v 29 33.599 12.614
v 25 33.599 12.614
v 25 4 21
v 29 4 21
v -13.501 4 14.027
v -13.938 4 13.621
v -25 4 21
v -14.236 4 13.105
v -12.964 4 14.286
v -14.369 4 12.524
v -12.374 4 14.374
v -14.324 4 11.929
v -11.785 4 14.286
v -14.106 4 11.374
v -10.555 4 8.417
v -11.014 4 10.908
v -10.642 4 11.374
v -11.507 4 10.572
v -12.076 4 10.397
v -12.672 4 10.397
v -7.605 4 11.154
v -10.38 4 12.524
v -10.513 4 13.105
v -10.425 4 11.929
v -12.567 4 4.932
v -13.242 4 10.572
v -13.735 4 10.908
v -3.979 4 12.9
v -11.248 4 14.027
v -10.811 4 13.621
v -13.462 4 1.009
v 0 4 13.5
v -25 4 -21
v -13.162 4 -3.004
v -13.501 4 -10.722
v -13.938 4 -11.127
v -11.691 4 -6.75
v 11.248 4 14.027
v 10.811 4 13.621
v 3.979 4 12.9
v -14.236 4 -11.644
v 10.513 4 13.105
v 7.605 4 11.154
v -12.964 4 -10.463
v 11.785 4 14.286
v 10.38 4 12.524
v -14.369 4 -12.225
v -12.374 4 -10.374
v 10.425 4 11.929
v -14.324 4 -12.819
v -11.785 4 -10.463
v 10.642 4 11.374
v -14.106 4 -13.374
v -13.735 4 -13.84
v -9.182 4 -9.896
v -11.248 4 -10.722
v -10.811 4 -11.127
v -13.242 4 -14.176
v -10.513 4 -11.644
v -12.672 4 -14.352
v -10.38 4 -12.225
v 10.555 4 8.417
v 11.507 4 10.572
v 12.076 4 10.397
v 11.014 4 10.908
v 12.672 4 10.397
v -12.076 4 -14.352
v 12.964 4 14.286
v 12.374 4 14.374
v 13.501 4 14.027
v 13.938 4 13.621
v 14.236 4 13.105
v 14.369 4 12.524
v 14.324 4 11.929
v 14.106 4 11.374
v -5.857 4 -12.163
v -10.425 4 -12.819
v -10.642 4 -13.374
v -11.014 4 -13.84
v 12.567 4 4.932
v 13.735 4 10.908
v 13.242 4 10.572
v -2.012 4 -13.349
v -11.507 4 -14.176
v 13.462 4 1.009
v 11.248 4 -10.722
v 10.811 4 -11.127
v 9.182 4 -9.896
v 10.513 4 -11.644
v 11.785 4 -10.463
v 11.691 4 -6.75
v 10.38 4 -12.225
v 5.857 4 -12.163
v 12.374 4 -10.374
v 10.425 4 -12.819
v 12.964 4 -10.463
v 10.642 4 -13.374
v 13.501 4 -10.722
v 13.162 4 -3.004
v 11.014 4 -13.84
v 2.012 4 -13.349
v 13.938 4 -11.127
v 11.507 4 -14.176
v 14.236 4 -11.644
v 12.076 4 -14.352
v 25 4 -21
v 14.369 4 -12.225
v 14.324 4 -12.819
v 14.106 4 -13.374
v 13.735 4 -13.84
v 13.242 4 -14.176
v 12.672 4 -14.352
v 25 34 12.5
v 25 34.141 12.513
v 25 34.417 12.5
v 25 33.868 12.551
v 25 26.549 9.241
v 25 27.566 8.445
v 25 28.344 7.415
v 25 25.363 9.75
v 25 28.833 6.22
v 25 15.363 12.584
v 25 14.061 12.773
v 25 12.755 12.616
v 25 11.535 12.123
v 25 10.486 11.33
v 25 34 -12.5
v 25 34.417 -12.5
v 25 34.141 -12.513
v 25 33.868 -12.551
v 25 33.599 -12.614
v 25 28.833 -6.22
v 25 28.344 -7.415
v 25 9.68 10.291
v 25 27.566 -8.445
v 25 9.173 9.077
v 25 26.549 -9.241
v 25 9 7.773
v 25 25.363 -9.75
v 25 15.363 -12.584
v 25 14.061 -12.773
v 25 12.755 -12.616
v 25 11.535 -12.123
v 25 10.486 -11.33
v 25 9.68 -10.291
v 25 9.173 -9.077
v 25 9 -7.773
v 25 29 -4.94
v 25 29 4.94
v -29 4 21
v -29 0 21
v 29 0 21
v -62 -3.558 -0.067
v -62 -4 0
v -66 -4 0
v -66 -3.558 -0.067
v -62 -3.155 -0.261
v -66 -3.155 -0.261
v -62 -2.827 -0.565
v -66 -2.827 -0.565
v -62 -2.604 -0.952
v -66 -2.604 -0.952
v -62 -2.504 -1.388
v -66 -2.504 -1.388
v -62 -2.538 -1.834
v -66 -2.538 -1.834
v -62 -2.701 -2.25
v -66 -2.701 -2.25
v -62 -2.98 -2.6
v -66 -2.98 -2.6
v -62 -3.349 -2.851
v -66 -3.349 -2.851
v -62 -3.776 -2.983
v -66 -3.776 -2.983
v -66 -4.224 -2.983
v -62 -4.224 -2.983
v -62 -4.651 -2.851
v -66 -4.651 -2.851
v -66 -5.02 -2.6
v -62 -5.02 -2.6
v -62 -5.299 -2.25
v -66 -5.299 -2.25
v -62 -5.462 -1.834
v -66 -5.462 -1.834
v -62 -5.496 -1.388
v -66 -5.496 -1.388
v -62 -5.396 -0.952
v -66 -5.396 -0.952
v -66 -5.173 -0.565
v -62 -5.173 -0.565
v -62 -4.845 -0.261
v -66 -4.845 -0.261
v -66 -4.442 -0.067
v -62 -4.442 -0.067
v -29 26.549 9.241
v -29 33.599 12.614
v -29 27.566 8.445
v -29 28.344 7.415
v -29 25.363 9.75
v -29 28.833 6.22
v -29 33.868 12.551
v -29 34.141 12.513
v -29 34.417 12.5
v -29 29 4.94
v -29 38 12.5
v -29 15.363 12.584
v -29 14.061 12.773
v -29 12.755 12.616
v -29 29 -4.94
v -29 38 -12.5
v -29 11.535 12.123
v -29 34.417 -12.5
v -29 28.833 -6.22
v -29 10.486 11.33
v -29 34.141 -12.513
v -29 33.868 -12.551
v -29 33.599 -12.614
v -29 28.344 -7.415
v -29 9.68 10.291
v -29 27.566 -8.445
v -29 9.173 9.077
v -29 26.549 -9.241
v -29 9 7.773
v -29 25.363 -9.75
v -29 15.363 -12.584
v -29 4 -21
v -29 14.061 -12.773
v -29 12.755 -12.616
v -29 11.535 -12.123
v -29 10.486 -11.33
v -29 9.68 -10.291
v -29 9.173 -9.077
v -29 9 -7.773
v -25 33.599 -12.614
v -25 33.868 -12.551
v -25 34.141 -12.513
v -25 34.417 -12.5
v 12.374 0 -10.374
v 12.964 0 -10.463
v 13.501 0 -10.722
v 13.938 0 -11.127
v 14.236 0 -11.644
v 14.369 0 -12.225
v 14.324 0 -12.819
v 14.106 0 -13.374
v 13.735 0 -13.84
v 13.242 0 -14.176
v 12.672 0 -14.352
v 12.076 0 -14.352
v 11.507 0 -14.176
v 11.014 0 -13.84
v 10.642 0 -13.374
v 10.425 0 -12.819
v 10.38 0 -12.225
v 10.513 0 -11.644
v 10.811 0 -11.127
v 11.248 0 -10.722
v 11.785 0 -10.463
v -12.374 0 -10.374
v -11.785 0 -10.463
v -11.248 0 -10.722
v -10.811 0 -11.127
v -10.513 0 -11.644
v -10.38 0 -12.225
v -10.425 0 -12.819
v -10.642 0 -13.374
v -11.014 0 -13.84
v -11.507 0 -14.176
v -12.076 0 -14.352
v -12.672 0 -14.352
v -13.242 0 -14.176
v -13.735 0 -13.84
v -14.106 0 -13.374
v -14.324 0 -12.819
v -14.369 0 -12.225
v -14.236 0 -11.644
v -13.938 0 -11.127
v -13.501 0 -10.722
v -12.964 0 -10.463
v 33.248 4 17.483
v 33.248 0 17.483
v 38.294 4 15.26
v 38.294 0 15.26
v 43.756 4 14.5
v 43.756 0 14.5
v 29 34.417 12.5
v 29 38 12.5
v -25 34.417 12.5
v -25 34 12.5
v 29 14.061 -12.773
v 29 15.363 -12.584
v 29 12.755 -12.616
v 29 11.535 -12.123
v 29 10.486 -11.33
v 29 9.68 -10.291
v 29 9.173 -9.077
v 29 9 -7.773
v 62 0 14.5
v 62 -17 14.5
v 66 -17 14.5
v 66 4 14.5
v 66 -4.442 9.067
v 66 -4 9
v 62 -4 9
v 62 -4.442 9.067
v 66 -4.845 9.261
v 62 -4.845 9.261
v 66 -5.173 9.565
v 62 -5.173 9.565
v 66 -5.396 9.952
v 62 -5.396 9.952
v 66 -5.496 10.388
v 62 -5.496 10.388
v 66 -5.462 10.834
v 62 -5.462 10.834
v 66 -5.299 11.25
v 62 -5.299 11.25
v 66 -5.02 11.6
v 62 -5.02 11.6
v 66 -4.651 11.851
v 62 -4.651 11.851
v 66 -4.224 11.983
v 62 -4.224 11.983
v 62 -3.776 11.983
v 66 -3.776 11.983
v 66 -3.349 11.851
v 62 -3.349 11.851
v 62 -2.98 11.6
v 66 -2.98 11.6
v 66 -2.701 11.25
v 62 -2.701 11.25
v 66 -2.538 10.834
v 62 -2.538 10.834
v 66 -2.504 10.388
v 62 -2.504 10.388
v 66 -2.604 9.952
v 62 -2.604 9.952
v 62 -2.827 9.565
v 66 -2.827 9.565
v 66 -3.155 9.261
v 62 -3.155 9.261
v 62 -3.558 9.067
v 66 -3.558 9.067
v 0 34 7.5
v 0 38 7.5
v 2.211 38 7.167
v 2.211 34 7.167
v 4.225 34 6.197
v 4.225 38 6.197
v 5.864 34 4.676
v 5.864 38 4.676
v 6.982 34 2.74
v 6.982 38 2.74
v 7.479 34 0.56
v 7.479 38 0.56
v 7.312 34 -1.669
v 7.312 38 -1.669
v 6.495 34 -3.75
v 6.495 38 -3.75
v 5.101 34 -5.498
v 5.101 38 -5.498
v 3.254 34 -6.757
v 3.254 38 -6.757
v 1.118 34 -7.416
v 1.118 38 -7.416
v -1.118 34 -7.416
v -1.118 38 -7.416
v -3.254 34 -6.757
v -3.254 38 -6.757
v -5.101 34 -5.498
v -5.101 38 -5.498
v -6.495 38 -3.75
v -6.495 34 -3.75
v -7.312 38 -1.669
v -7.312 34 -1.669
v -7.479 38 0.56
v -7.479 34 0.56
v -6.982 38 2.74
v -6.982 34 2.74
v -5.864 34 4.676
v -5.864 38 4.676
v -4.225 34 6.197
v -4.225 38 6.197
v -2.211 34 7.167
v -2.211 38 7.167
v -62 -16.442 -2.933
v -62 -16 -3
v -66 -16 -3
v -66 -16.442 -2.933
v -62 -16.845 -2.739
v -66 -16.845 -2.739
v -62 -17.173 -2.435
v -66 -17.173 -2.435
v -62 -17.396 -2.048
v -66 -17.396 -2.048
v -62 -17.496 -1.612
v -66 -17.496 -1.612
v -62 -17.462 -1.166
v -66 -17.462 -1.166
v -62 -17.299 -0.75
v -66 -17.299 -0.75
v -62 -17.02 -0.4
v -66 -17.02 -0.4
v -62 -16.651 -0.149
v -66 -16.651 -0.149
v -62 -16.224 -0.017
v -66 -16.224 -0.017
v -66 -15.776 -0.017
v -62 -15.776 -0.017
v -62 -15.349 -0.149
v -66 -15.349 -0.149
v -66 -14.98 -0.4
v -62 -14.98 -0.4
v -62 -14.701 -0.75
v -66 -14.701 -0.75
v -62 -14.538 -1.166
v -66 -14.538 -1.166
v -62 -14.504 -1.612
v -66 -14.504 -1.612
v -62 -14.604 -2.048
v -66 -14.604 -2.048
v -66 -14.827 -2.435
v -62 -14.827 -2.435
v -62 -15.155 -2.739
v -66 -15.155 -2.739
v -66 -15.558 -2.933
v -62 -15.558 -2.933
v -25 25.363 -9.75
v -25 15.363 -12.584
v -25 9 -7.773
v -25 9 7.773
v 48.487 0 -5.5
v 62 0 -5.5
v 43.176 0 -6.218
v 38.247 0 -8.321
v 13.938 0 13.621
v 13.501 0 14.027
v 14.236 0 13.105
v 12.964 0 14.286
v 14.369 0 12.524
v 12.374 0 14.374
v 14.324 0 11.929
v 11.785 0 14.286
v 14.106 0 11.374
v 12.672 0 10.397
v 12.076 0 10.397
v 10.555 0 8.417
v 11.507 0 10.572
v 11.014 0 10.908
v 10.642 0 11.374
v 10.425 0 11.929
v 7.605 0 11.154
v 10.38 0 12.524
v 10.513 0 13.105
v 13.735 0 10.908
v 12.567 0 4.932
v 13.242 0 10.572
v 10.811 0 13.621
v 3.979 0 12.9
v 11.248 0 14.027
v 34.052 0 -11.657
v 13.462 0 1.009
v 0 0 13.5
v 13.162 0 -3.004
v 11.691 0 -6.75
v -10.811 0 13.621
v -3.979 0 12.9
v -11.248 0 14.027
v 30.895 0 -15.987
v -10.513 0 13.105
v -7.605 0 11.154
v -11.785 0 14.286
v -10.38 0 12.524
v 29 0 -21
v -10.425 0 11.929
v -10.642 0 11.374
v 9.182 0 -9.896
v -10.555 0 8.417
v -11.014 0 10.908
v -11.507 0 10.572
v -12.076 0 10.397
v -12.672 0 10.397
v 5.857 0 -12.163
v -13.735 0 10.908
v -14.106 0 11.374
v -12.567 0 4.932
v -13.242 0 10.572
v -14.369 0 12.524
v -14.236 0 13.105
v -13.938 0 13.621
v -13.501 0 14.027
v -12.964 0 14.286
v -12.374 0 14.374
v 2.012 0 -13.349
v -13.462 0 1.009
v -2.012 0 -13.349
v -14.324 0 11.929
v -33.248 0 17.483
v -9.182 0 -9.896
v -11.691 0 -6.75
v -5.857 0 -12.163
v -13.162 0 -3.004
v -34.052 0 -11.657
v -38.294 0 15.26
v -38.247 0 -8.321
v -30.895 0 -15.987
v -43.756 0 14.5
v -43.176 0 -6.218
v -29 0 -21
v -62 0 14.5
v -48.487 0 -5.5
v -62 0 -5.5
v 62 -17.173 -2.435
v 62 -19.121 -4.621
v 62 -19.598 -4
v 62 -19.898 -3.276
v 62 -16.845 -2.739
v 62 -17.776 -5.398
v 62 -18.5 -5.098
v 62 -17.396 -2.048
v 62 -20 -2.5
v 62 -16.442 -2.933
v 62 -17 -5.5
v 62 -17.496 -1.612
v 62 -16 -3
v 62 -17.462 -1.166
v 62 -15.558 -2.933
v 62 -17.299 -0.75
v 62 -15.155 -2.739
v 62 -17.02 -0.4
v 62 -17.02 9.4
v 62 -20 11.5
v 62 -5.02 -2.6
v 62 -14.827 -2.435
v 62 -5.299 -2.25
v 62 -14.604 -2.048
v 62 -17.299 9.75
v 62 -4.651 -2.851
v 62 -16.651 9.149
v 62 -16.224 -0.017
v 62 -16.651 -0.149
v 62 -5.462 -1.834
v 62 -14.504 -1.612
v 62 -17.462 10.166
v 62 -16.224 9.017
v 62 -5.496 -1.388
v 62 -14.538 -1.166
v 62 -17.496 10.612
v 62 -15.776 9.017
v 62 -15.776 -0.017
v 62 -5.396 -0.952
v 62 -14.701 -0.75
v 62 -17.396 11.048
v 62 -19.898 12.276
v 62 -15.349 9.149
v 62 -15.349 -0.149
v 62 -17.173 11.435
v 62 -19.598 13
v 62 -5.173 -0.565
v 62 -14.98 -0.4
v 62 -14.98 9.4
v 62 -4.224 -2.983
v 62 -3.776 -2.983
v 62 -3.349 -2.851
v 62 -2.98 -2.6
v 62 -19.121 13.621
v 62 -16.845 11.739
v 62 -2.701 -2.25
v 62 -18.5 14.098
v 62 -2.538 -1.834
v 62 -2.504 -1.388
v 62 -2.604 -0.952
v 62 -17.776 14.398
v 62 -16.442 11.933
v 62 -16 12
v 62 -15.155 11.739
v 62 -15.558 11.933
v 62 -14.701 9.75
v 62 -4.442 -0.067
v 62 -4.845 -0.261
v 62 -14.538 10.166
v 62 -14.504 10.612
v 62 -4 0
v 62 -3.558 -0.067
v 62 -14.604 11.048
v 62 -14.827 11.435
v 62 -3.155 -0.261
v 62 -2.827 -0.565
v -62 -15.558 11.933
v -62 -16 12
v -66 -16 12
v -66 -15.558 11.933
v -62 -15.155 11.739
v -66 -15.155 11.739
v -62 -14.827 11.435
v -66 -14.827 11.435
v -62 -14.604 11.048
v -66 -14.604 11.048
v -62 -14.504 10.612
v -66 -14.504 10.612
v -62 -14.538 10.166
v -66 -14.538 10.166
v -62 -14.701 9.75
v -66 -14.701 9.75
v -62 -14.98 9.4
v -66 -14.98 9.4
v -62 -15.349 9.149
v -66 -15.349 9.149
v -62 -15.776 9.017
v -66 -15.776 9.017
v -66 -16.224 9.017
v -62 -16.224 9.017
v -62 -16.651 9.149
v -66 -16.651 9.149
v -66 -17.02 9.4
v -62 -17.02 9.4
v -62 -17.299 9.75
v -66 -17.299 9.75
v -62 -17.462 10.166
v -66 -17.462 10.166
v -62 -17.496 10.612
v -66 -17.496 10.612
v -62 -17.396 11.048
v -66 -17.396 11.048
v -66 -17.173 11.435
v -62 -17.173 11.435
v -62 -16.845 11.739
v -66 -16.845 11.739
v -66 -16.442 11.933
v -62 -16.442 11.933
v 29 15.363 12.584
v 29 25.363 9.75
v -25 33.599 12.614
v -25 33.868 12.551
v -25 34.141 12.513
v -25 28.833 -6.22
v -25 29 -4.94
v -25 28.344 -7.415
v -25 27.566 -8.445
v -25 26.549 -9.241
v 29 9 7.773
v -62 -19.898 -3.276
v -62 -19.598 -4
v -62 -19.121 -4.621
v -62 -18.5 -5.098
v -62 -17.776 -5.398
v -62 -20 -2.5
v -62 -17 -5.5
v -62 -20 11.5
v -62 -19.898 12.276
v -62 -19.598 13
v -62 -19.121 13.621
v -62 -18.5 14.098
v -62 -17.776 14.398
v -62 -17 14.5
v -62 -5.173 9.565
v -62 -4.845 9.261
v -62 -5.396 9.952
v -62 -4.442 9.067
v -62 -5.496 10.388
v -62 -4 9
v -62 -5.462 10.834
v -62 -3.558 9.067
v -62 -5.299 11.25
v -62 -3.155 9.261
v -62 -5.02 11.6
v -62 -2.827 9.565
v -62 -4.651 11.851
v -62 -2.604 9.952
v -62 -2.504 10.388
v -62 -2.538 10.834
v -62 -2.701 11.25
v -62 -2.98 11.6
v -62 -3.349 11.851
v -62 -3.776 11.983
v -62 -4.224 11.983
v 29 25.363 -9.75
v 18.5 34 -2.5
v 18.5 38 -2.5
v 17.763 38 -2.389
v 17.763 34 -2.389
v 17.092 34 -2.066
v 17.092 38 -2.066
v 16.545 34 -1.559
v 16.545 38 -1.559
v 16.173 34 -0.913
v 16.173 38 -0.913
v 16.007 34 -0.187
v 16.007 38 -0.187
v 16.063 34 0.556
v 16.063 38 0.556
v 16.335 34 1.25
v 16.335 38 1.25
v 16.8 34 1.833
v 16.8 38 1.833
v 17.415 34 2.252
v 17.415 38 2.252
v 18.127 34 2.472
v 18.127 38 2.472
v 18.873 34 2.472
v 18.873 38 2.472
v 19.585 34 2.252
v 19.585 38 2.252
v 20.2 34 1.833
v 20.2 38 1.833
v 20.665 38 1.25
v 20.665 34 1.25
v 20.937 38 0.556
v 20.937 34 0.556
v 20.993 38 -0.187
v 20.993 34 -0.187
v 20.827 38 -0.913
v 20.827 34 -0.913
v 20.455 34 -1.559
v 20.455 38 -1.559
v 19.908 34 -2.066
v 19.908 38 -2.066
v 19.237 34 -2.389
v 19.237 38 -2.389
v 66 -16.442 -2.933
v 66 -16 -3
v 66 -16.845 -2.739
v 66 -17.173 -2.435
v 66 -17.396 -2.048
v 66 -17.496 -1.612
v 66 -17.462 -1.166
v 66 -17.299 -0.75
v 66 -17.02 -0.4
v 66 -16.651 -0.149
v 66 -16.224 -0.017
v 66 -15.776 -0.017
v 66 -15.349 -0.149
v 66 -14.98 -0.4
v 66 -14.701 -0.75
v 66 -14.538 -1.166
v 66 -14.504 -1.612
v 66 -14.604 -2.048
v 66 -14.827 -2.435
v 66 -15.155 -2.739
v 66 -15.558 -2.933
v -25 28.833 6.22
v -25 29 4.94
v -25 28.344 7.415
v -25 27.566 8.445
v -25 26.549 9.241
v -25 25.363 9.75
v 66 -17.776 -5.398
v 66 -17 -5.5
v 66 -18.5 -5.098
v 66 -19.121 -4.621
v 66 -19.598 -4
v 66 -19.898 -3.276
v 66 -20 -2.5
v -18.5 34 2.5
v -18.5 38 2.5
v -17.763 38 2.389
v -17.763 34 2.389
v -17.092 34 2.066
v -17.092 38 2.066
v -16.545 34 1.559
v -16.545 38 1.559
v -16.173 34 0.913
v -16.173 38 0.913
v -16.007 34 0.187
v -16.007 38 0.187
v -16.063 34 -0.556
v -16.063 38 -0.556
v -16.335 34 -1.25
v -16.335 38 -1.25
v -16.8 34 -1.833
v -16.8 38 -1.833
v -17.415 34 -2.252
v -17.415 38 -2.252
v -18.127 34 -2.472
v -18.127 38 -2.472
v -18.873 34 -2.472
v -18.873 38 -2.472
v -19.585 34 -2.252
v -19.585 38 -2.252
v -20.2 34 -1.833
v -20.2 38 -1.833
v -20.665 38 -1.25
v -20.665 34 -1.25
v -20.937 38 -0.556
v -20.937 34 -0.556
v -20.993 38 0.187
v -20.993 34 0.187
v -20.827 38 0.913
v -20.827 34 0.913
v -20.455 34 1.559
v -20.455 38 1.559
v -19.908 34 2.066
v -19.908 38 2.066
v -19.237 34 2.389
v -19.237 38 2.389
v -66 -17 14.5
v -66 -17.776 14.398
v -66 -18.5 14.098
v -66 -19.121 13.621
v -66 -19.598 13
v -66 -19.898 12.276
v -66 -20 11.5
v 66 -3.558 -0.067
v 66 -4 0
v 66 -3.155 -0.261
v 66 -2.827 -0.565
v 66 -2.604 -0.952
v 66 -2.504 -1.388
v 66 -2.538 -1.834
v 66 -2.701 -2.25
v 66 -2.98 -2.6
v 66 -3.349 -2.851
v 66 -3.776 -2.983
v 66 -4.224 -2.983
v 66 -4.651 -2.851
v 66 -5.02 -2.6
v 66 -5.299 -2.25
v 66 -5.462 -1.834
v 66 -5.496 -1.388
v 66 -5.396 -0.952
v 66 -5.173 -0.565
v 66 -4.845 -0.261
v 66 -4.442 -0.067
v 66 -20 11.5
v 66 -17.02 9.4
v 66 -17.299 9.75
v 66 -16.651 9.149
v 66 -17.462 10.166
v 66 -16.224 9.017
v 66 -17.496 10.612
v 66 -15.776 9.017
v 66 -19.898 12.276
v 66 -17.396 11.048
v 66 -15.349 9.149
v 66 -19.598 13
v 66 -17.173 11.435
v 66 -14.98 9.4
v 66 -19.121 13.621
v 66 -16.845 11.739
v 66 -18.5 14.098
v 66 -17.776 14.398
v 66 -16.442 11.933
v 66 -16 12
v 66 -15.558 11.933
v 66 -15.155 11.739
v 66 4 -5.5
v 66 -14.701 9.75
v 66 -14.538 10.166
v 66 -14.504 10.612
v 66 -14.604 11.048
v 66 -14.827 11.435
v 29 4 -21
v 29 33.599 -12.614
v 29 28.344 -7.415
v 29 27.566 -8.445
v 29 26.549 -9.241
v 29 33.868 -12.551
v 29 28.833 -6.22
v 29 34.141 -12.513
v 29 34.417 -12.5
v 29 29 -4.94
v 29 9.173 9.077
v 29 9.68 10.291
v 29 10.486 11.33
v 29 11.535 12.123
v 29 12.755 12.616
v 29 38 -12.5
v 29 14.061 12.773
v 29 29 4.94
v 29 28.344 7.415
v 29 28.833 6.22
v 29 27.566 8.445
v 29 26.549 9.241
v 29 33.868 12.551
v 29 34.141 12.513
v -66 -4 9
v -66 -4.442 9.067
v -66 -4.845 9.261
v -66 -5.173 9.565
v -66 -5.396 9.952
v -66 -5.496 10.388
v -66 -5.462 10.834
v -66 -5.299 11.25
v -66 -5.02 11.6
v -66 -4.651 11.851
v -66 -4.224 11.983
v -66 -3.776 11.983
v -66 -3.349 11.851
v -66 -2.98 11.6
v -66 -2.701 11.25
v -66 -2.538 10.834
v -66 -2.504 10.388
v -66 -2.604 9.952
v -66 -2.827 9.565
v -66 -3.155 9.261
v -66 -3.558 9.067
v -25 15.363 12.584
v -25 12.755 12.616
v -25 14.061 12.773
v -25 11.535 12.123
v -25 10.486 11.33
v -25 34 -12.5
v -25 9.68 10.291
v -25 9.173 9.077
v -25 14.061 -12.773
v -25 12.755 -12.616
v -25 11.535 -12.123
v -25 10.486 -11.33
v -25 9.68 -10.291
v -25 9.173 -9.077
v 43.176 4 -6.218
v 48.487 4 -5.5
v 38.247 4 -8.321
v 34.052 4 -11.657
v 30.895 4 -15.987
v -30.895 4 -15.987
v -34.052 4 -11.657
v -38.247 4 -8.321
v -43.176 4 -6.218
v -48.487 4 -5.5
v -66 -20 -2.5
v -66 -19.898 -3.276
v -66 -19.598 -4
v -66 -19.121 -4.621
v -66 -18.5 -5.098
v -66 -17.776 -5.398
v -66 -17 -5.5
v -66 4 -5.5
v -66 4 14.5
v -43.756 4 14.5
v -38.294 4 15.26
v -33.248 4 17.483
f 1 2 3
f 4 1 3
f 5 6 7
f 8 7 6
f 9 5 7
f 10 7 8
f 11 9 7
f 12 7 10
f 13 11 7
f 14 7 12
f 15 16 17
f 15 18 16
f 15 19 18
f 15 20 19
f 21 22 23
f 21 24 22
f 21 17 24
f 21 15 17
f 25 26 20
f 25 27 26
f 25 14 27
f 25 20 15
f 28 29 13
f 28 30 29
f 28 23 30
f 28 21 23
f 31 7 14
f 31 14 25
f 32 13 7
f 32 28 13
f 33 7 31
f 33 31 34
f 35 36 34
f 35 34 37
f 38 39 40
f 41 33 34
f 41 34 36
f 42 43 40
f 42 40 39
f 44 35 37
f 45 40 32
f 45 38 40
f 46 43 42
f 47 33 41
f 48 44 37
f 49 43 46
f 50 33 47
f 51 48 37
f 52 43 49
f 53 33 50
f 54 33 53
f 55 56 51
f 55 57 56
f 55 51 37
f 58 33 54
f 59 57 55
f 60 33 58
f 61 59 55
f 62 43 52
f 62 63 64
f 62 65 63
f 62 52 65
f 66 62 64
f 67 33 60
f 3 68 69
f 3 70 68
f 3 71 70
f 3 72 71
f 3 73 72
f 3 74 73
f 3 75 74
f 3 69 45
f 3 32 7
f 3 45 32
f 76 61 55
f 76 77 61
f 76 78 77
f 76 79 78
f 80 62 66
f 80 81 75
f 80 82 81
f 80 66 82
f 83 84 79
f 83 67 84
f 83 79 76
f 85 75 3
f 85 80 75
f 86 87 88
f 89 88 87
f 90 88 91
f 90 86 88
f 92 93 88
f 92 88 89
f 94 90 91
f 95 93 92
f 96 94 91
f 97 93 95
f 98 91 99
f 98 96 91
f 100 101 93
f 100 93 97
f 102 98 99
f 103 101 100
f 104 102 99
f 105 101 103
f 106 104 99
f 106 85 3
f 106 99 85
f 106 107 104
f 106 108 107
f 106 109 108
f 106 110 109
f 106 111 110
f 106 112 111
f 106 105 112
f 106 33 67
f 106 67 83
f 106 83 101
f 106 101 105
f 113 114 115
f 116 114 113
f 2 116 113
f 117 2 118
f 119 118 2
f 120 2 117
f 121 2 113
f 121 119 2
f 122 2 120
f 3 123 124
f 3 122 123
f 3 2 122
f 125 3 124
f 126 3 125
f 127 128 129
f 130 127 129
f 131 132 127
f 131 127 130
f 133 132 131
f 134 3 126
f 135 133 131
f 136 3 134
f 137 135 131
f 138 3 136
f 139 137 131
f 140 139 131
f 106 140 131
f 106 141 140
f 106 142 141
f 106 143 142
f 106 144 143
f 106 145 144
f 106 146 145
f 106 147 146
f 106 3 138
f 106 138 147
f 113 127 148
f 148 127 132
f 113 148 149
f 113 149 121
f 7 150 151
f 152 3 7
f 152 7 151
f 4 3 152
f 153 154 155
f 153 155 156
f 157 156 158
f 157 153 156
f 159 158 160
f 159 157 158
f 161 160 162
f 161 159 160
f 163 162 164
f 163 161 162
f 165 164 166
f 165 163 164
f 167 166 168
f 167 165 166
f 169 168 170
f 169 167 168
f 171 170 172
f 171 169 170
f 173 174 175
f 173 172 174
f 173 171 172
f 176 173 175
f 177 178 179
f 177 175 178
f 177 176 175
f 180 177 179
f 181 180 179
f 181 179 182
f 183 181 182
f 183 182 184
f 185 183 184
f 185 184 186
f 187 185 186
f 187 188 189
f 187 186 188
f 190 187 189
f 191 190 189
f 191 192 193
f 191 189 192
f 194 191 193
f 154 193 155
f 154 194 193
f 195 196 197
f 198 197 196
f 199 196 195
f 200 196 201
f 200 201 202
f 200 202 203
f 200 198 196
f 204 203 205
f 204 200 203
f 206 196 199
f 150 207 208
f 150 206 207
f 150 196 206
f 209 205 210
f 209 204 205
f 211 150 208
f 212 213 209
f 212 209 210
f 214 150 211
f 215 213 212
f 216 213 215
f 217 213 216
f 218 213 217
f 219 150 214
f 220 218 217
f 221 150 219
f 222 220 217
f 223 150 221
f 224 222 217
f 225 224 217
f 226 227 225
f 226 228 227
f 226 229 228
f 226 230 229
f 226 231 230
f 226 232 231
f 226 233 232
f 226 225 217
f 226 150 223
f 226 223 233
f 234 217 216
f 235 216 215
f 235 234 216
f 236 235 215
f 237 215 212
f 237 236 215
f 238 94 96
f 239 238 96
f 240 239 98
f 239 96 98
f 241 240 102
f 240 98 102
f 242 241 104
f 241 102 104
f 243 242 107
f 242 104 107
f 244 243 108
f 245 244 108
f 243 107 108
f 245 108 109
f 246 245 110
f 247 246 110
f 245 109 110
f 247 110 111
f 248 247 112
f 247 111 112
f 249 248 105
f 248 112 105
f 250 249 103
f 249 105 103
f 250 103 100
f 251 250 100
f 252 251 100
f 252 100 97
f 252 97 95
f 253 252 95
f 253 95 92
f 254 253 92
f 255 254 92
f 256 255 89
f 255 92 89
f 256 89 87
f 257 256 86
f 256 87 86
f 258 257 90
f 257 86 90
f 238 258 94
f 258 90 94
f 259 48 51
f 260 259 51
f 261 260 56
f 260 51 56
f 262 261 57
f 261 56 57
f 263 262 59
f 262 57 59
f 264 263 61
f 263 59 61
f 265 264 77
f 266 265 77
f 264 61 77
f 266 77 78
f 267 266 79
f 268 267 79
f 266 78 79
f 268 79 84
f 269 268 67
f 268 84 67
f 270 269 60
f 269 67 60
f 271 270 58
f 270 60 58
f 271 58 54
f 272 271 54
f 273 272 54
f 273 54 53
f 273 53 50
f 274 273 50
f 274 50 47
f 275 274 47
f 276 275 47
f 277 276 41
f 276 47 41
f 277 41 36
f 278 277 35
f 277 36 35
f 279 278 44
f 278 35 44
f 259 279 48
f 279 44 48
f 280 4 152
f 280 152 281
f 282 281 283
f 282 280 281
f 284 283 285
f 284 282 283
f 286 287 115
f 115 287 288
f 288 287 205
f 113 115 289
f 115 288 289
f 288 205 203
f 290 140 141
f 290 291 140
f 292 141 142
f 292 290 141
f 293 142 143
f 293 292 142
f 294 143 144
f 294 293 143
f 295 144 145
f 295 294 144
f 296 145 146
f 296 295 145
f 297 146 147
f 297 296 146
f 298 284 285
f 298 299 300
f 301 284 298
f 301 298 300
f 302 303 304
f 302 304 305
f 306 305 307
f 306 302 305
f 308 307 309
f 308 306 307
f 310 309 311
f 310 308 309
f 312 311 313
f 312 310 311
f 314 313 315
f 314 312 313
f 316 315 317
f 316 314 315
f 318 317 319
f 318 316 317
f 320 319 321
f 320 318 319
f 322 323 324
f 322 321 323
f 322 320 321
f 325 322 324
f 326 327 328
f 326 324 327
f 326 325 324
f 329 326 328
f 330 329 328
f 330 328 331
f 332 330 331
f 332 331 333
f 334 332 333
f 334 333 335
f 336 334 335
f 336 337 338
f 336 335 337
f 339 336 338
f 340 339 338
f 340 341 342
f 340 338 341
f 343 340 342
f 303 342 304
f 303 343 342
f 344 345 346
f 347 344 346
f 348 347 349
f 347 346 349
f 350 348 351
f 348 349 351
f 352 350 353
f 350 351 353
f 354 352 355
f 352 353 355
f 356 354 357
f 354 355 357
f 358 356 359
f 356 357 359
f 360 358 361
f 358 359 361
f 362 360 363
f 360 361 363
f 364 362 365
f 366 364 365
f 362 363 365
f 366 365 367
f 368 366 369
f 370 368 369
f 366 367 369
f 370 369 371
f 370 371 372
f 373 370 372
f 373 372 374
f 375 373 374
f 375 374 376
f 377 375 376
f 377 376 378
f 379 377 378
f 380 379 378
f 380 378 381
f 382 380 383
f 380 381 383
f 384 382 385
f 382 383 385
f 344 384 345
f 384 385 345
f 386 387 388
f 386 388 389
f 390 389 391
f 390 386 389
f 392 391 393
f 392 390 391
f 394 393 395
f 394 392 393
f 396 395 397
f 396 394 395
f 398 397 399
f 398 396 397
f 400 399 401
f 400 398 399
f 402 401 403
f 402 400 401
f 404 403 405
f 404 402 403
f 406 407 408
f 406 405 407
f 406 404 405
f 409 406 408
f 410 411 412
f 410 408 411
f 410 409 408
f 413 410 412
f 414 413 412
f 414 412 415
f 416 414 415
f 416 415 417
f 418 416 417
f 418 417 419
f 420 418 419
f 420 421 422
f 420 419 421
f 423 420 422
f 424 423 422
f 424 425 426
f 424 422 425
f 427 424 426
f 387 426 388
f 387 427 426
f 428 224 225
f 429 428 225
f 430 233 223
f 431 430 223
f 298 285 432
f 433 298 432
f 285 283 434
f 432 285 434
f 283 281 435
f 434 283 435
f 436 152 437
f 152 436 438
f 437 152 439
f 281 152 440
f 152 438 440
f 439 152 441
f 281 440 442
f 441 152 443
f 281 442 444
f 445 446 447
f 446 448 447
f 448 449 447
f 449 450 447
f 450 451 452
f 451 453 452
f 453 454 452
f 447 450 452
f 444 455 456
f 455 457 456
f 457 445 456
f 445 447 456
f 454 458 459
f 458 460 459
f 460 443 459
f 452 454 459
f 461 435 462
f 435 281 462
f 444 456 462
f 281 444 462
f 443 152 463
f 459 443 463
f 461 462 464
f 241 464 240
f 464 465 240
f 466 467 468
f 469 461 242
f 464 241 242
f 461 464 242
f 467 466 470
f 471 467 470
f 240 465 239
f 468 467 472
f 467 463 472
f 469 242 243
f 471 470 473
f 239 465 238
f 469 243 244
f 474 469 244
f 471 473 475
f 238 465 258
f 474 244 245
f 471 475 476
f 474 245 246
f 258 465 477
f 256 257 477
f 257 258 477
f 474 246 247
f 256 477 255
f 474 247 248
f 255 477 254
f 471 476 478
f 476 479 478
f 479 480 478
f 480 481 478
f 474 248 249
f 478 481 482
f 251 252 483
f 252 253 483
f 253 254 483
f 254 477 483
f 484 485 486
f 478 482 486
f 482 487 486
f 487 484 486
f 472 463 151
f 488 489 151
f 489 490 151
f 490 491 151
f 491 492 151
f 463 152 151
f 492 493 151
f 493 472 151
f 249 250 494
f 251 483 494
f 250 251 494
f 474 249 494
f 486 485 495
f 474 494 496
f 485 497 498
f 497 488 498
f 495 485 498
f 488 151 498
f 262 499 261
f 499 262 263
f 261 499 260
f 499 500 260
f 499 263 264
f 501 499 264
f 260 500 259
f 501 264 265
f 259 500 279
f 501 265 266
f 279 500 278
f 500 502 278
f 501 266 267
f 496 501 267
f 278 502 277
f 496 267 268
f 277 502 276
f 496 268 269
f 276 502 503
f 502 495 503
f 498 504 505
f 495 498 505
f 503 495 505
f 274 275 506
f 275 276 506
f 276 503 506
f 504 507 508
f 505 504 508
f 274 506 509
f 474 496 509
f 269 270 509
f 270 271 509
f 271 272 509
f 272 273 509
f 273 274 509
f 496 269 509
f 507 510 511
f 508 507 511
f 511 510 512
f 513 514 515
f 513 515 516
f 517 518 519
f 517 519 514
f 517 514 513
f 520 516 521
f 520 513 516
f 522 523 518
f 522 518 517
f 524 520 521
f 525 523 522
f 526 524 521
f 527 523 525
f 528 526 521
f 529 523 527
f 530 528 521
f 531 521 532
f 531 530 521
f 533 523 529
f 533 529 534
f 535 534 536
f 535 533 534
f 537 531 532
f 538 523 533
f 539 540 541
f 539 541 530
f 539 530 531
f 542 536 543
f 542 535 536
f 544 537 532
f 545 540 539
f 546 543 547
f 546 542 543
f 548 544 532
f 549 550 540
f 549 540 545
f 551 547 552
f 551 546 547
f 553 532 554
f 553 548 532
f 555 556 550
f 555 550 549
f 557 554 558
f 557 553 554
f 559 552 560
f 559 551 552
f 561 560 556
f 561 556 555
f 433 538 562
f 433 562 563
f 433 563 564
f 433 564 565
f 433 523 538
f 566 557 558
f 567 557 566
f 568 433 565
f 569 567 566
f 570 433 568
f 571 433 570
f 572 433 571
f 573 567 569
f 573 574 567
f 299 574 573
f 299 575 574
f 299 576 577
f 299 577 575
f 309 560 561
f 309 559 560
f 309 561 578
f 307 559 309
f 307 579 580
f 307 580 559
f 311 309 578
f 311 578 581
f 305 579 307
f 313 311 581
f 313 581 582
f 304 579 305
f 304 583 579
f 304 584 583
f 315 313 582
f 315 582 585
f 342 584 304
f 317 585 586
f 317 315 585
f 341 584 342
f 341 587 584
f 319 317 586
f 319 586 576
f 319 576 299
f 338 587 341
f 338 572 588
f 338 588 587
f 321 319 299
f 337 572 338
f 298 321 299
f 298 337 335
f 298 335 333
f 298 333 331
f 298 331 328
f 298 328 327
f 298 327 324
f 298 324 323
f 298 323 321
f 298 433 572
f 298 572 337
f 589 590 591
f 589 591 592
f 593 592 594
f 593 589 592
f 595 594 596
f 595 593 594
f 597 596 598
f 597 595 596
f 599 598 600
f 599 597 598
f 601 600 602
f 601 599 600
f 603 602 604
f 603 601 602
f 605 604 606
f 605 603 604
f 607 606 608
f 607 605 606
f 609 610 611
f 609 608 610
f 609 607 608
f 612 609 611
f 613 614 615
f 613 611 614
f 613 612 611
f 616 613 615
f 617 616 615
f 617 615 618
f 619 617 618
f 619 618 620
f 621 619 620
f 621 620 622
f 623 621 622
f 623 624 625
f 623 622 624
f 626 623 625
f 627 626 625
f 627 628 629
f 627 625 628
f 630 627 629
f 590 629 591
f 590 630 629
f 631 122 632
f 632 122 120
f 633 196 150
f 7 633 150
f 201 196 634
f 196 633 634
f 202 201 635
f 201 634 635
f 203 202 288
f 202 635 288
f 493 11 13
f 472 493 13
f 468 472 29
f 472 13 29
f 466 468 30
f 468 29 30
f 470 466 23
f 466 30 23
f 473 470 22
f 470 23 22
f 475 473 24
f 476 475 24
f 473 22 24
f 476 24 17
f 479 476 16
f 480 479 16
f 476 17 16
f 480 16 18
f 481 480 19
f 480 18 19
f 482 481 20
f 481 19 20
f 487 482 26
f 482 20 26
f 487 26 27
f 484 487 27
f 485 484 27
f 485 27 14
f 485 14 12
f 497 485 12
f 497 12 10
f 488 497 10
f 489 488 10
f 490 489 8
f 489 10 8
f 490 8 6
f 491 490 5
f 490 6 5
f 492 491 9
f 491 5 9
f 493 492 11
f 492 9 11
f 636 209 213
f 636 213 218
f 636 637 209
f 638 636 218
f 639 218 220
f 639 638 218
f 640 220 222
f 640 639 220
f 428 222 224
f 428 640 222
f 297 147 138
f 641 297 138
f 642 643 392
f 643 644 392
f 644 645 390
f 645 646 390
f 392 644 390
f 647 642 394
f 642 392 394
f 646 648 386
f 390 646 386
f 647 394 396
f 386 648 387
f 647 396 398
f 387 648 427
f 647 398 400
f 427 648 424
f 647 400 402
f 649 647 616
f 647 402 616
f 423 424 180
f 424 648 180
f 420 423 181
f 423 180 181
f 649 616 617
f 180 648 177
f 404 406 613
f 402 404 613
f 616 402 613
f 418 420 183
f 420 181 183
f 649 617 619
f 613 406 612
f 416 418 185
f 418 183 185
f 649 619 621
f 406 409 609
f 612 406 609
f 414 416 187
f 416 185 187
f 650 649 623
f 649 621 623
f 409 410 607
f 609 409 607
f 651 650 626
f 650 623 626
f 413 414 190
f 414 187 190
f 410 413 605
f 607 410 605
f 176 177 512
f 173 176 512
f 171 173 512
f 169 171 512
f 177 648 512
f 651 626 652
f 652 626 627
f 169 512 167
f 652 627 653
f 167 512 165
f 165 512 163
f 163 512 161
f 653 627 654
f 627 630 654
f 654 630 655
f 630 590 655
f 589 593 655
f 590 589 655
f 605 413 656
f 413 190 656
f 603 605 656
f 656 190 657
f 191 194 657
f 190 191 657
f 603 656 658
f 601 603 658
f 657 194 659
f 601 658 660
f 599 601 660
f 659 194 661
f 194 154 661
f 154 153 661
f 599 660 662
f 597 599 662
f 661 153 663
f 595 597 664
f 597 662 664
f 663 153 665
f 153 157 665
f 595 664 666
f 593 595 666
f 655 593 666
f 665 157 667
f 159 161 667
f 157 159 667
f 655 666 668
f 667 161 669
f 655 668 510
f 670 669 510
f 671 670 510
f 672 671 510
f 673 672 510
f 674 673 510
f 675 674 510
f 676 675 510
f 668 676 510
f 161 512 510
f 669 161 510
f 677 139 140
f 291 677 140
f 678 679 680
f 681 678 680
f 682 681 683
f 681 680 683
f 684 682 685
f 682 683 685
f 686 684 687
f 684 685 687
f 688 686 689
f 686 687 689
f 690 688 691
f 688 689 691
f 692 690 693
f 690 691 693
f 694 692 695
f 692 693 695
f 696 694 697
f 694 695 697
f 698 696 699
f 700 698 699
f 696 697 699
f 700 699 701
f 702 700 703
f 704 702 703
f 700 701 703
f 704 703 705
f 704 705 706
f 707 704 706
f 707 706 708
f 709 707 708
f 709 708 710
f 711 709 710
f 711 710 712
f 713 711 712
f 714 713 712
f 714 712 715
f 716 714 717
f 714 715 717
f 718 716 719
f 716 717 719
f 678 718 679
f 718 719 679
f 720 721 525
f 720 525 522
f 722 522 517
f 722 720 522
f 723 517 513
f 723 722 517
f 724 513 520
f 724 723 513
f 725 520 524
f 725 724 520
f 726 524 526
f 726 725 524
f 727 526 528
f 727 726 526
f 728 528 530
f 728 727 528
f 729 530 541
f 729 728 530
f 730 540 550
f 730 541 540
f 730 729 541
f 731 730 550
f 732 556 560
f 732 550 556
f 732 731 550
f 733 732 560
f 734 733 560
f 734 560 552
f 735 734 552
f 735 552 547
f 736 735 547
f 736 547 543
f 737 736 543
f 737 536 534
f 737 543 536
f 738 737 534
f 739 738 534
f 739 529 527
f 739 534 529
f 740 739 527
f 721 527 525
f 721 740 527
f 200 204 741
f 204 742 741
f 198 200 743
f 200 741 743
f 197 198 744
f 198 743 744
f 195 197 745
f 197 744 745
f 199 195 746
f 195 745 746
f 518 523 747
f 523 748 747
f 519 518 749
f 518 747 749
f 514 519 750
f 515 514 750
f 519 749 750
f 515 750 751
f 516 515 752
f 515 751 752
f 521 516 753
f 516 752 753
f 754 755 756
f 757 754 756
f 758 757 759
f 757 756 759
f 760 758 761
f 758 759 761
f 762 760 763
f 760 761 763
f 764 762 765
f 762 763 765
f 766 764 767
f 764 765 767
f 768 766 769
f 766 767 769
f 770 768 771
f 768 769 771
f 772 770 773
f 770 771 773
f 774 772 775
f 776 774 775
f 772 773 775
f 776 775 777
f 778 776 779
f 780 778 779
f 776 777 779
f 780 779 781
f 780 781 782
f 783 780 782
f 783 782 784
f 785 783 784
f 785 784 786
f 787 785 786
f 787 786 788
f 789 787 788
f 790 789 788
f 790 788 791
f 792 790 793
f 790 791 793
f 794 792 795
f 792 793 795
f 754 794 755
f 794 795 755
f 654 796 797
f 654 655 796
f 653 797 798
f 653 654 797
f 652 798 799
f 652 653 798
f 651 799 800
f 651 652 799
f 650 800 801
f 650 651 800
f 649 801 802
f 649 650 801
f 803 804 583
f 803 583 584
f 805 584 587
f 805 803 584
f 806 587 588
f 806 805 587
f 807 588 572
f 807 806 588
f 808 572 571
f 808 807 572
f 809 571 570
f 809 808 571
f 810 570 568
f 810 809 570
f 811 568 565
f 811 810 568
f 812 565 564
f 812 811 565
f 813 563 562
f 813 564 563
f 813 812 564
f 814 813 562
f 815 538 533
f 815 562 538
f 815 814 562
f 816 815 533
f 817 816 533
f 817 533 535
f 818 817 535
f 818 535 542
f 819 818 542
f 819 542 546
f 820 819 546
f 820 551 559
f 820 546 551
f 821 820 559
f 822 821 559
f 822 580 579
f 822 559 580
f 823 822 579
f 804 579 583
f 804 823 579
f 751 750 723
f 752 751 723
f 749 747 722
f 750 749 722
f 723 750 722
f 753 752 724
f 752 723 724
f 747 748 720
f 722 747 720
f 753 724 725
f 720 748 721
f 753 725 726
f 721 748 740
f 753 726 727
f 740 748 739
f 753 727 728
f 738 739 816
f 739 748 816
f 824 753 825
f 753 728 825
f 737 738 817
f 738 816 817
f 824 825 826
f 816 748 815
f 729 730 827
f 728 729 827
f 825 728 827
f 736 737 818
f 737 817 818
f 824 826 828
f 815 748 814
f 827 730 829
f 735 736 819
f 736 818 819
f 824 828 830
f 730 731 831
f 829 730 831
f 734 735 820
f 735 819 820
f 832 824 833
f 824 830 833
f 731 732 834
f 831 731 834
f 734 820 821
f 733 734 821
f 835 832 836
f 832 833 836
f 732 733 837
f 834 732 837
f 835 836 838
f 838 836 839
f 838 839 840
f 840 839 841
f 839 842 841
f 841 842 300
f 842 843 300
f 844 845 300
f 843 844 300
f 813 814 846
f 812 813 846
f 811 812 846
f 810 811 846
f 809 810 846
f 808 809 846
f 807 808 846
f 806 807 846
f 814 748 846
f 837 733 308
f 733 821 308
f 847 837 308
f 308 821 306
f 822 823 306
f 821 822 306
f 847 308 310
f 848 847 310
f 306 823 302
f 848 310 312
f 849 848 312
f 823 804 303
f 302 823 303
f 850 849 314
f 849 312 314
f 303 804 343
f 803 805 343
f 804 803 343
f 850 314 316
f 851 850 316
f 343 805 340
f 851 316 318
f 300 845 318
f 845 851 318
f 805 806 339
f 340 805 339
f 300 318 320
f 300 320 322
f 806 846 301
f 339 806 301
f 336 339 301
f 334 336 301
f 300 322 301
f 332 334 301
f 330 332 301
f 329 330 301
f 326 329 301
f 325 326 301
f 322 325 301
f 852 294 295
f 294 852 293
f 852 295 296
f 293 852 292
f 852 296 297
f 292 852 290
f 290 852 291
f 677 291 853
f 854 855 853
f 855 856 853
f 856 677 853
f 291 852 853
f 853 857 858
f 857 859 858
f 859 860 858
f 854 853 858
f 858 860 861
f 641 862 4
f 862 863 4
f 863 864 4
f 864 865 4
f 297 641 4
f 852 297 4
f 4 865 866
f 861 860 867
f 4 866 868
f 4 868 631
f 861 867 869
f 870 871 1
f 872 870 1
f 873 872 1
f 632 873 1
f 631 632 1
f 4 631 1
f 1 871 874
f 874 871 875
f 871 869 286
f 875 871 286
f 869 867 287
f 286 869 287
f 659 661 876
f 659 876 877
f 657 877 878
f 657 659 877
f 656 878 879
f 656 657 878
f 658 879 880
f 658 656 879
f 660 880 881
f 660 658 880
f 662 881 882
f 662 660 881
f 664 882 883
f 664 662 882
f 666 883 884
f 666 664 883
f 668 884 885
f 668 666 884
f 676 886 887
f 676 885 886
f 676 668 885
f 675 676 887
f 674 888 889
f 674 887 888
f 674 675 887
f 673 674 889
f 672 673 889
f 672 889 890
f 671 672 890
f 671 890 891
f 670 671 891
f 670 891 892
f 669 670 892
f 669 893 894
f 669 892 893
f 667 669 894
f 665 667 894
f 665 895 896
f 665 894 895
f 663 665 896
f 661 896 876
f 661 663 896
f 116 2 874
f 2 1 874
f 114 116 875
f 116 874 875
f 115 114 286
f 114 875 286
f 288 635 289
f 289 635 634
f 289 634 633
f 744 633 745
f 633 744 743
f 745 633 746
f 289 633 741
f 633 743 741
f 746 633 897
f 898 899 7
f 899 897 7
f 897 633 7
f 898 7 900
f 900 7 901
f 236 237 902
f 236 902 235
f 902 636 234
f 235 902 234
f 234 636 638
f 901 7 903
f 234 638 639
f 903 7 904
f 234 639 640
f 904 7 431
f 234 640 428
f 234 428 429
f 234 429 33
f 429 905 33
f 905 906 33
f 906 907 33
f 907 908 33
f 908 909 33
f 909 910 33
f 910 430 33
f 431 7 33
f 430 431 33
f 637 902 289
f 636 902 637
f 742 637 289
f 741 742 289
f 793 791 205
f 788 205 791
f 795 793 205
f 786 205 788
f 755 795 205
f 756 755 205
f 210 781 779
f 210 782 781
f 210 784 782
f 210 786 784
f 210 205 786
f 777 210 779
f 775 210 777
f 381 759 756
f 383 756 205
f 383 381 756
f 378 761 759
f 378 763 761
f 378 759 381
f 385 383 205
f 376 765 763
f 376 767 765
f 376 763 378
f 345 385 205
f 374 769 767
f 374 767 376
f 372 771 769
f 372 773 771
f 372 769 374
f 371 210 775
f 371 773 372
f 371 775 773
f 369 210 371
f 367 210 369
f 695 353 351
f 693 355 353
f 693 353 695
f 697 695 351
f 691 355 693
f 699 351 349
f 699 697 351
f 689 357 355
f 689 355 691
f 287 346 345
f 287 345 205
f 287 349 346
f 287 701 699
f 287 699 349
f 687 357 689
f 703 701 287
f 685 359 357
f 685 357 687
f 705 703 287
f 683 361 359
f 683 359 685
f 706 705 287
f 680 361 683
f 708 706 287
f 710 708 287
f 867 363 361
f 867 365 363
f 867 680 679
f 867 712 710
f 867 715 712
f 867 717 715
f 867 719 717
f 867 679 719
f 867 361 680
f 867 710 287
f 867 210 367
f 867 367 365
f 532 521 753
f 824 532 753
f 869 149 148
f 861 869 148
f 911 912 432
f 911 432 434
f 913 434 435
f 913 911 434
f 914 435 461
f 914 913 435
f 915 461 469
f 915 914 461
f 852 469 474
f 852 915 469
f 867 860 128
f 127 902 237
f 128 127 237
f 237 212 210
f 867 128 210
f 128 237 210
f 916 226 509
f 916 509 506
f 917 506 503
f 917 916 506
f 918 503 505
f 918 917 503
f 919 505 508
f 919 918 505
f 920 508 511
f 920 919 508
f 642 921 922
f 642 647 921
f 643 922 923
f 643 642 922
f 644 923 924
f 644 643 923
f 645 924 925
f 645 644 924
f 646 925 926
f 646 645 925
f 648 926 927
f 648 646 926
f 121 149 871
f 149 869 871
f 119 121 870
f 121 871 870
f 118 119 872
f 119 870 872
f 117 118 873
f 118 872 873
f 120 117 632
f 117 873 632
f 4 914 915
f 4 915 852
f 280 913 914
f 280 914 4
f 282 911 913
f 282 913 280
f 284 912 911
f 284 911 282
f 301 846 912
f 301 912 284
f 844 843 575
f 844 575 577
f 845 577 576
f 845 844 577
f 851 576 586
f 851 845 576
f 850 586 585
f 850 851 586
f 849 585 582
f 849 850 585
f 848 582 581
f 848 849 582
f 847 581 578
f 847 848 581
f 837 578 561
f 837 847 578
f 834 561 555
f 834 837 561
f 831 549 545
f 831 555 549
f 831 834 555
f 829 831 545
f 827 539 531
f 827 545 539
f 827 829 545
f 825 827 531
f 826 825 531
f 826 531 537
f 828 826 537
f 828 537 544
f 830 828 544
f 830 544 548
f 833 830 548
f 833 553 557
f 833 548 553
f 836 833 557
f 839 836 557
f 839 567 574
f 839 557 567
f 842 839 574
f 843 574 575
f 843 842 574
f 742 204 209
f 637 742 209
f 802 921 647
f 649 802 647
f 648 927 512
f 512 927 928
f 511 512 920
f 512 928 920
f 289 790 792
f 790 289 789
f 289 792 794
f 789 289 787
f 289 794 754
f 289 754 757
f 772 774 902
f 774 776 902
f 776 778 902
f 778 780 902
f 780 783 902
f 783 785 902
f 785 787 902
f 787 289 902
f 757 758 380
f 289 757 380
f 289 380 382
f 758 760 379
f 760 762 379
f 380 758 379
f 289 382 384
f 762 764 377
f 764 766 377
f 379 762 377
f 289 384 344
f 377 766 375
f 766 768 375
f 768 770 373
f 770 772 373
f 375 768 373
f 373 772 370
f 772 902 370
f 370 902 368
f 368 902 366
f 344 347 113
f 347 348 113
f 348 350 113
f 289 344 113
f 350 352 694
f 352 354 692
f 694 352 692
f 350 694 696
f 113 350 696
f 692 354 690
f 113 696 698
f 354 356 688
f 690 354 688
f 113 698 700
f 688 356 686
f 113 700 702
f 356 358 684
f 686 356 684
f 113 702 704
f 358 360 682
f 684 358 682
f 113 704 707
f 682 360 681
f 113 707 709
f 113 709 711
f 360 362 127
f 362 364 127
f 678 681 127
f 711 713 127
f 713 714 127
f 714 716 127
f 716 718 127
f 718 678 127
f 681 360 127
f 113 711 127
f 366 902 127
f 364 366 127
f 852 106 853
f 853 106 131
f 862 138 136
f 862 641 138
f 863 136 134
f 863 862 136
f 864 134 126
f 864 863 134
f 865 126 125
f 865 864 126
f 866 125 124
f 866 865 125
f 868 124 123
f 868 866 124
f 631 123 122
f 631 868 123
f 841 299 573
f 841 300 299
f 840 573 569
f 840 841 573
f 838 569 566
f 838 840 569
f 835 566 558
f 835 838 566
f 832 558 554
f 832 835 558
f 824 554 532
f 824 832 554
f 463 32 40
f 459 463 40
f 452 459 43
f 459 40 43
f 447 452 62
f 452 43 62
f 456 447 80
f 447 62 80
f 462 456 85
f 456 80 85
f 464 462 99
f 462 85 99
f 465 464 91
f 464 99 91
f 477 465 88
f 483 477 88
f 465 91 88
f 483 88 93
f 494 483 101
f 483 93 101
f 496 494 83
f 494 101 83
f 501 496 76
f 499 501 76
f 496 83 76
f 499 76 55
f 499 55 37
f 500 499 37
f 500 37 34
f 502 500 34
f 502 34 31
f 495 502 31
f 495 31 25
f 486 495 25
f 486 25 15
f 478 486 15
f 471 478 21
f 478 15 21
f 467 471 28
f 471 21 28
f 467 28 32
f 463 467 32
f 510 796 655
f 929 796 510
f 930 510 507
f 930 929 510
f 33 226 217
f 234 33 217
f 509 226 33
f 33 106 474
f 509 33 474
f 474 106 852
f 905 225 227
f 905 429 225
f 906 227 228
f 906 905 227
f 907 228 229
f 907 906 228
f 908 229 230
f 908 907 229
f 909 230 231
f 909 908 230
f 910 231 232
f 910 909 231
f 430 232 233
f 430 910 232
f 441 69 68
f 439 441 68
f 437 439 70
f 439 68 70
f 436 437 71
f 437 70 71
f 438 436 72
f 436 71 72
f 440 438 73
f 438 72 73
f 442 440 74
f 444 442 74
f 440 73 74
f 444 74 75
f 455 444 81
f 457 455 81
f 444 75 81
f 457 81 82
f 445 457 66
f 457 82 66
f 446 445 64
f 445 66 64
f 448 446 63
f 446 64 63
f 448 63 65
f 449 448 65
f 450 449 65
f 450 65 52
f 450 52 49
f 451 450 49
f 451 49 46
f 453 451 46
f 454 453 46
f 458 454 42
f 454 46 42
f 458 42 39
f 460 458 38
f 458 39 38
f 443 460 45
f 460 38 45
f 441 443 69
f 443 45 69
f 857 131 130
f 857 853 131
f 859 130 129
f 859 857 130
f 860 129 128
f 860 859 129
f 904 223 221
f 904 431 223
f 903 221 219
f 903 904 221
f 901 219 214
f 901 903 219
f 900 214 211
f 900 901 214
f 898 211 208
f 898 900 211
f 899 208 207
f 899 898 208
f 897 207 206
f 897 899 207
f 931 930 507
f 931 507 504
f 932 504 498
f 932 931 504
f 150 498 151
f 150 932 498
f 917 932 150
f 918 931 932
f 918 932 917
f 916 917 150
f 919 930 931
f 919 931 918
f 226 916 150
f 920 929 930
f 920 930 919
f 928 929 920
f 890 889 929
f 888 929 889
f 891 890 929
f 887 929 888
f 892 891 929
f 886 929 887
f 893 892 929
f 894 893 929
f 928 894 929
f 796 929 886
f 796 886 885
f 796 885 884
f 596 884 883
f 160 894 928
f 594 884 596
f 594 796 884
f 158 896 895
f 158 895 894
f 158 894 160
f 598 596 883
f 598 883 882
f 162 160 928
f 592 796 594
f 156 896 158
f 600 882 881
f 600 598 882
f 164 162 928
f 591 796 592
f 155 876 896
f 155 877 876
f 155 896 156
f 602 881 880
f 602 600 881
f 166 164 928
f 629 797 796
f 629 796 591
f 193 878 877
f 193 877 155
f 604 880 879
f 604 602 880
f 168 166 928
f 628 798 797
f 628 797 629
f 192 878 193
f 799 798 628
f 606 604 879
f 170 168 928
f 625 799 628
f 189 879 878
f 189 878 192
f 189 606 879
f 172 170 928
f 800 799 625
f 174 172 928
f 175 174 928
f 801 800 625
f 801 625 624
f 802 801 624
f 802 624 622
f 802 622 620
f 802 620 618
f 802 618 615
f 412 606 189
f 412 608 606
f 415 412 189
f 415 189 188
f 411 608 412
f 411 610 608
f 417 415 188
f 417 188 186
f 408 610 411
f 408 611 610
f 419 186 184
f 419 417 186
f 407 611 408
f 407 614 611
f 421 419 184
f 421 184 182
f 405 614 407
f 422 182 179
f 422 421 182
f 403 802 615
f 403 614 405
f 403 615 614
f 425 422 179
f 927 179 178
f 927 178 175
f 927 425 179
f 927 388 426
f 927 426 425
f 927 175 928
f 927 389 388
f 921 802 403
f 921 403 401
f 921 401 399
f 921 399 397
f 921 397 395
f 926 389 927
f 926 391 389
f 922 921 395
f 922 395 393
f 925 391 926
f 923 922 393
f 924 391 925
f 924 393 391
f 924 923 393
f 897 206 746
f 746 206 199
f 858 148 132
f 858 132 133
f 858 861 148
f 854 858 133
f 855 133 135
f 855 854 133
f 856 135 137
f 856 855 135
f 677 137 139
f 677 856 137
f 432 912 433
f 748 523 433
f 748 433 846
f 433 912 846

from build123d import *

# Parameters (mm, degrees)
SKETCH_1_W               = 132
SKETCH_1_H               = 42
EXTRUDE_1_DEPTH          = 4
SKETCH_2_R               = 2
SKETCH_2_R_2             = 13.5
CUT_EXTRUDE_1_DEPTH      = 4
SKETCH_3_W               = 4
SKETCH_3_H               = 42
EXTRUDE_2_DEPTH          = 30
SKETCH_4_W               = 58
SKETCH_4_H               = 42
EXTRUDE_3_DEPTH          = 4
SKETCH_5_W               = 4
SKETCH_5_H               = 42
EXTRUDE_4_DEPTH          = 20
SKETCH_6_R               = 7.5
SKETCH_6_R_2             = 2.5
CUT_EXTRUDE_2_DEPTH      = 4
CUT_EXTRUDE_3_DEPTH      = 105.450945424
FILLET_1_R               = 3
SKETCH_8_W               = 37
SKETCH_8_H               = 6.5
CUT_EXTRUDE_4_DEPTH      = 24
FILLET_2_R               = 20
CUT_EXTRUDE_6_DEPTH      = 105.450945424
CUT_EXTRUDE_7_DEPTH      = 139.956827828
CUT_EXTRUDE_7_DEPTH_BACK = 139.956827828
SKETCH_12_R              = 1.5
FILLET_5_R               = 3
FILLET_6_R               = 5


with BuildPart() as part:
    # 草图1 → 凸台-拉伸1 (new body)
    with BuildSketch(Plane(origin=(0, 0, 0), x_dir=(1, 0, 0), z_dir=(0, 1, 0))):
        Rectangle(SKETCH_1_W, SKETCH_1_H)
    extrude(amount=EXTRUDE_1_DEPTH)

    # 草图2 → 切除-拉伸1 (cut)
    with BuildSketch(Plane(origin=(0, 4, 0), x_dir=(1, 0, 0), z_dir=(0, 1, 0))):
        with Locations(Location((12.374368671, 12.374368671, 0), (0, 0, 270))):
            Circle(SKETCH_2_R)
        with Locations(Location((12.374368671, -12.374368671, 0), (0, 0, 270))):
            Circle(SKETCH_2_R)
        with Locations(Location((-12.374368671, -12.374368671, 0), (0, 0, 270))):
            Circle(SKETCH_2_R)
        with Locations(Location((-12.374368671, 12.374368671, 0), (0, 0, 270))):
            Circle(SKETCH_2_R)
        with Locations(Location((0, 0, 0), (0, 0, 270))):
            Circle(SKETCH_2_R_2)
    extrude(amount=-CUT_EXTRUDE_1_DEPTH, mode=Mode.SUBTRACT)

    # 草图3 → 凸台-拉伸2 (add)
    with BuildSketch(Plane(origin=(0, 4, 0), x_dir=(1, 0, 0), z_dir=(0, 1, 0))):
        with Locations((27, 0)):
            Rectangle(SKETCH_3_W, SKETCH_3_H)
        with Locations((-27, 0)):
            Rectangle(SKETCH_3_W, SKETCH_3_H)
    extrude(amount=EXTRUDE_2_DEPTH)

    # 草图4 → 凸台-拉伸3 (add)
    with BuildSketch(Plane(origin=(0, 34, 0), x_dir=(1, 0, 0), z_dir=(0, 1, 0))):
        Rectangle(SKETCH_4_W, SKETCH_4_H)
    extrude(amount=EXTRUDE_3_DEPTH)

    # 草图5 → 凸台-拉伸4 (add)
    with BuildSketch(Plane.XZ):
        with Locations((64, 0)):
            Rectangle(SKETCH_5_W, SKETCH_5_H)
        with Locations((-64, 0)):
            Rectangle(SKETCH_5_W, SKETCH_5_H)
    extrude(amount=EXTRUDE_4_DEPTH)

    # 草图6 → 切除-拉伸2 (cut)
    with BuildSketch(Plane(origin=(0, 38, 0), x_dir=(1, 0, 0), z_dir=(0, 1, 0))):
        with Locations(Location((0, 0, 0), (0, 0, 270))):
            Circle(SKETCH_6_R)
        with Locations(Location((-18.5, 0, 0), (0, 0, 270))):
            Circle(SKETCH_6_R_2)
        with Locations(Location((18.5, 0, 0), (0, 0, 90))):
            Circle(SKETCH_6_R_2)
    extrude(amount=-CUT_EXTRUDE_2_DEPTH, mode=Mode.SUBTRACT)

    # 草图7 → 切除-拉伸3 (cut, through all)
    with BuildSketch(Plane.ZY.offset(29)):
        Polygon((-21, 4), (-12.5, 34), (-12.5, 38), (-21, 38), align=None)
        Polygon((21, 38), (12.5, 38), (12.5, 34), (21, 4), align=None)
    extrude(amount=-CUT_EXTRUDE_3_DEPTH, mode=Mode.SUBTRACT)

    # 圆角1
    fillet_1_edges = [part.edges().sort_by_distance(p)[0] for p in [
        (-27, 34, -12.5),
        (27, 34, -12.5),
        (27, 34, 12.5),
        (-27, 34, 12.5),
    ]]
    fillet(fillet_1_edges, radius=FILLET_1_R)

    # 草图8 → 切除-拉伸4 (cut)
    with BuildSketch(Plane(origin=(0, 4, 0), x_dir=(1, 0, 0), z_dir=(0, 1, 0))):
        Polygon((-66, 5.5), (-66, 21), (-29, 21), (-29, 5.5), (-62, 5.5), align=None)
        with Locations((47.5, -17.75)):
            Rectangle(SKETCH_8_W, SKETCH_8_H)
        Polygon((66, 5.5), (66, 21), (29, 21), (29, 5.5), (62, 5.5), align=None)
        with Locations((-47.5, -17.75)):
            Rectangle(SKETCH_8_W, SKETCH_8_H)
    extrude(amount=-CUT_EXTRUDE_4_DEPTH, mode=Mode.SUBTRACT)

    # 圆角2
    # the kernel refuses this fillet: 20 mm, written as the material it adds along each edge
    with BuildSketch(Plane(origin=(29, 4, 14.5), x_dir=(0, 0, 1), z_dir=(0, -1, 0))) as fillet_2_piece_1:
        with BuildLine():
            CenterArc((20, -14.756354563), FILLET_2_R, 132.454150204, 47.545849796)
            Line((0, -14.756354563), (0, 0))
            Line((0, 0), (6.5, 0))
        make_face()
    extrude(amount=4)
    with BuildSketch(Plane(origin=(29, 4, -5.5), x_dir=(0, 0, -1), z_dir=(0, -1, 0))) as fillet_2_piece_2:
        with BuildLine():
            CenterArc((20, 19.48717527), FILLET_2_R, 180, 76.997121837)
            Line((0, 19.48717527), (0, 0))
            Line((0, 0), (15.5, 0))
        make_face()
    extrude(amount=4)
    with BuildSketch(Plane(origin=(-29, 4, -5.5), x_dir=(0, 0, -1), z_dir=(0, -1, 0))) as fillet_2_piece_3:
        with BuildLine():
            CenterArc((20, -19.48717527), FILLET_2_R, 103.002878163, 76.997121837)
            Line((0, -19.48717527), (0, 0))
            Line((0, 0), (15.5, 0))
        make_face()
    extrude(amount=4)
    with BuildSketch(Plane(origin=(-29, 4, 14.5), x_dir=(0, 0, 1), z_dir=(0, -1, 0))) as fillet_2_piece_4:
        with BuildLine():
            CenterArc((20, 14.756354563), FILLET_2_R, 180, 47.545849796)
            Line((0, 14.756354563), (0, 0))
            Line((0, 0), (6.5, 0))
        make_face()
    extrude(amount=4)

    # 草图11 → 切除-拉伸6 (cut, through all)
    with BuildSketch(Plane.ZY.offset(29)):
        Polygon((8.719846057, 29), (-8.719846057, 29), (-14.386512724, 9), (14.386512724, 9), align=None)
    extrude(amount=-CUT_EXTRUDE_6_DEPTH, mode=Mode.SUBTRACT)

    # 草图12 → 切除-拉伸7 (cut, two sides: drawn at the far end of the back side and taken through both)
    with BuildSketch(Plane.ZY.offset(66).offset(-CUT_EXTRUDE_7_DEPTH_BACK)):
        with Locations((-1.5, -4)):
            Circle(SKETCH_12_R)
        with Locations(Location((10.5, -4, 0), (0, 0, 180))):
            Circle(SKETCH_12_R)
        with Locations((10.5, -16)):
            Circle(SKETCH_12_R)
        with Locations(Location((-1.5, -16, 0), (0, 0, 180))):
            Circle(SKETCH_12_R)
    extrude(amount=CUT_EXTRUDE_7_DEPTH + CUT_EXTRUDE_7_DEPTH_BACK, mode=Mode.SUBTRACT)

    # 圆角5
    fillet_5_edges = [part.edges().sort_by_distance(p)[0] for p in [
        (64, -20, -5.5),
        (-64, -20, 14.5),
        (64, -20, 14.5),
        (-64, -20, -5.5),
    ]]
    fillet(fillet_5_edges, radius=FILLET_5_R)

    # 圆角6
    fillet_6_edges = [part.edges().sort_by_distance(p)[0] for p in [
        (-27, 29, 8.719846057),
        (27, 29, 8.719846057),
        (-27, 9, 14.386512724),
        (27, 9, 14.386512724),
        (-27, 9, -14.386512724),
        (27, 9, -14.386512724),
        (-27, 29, -8.719846057),
        (27, 29, -8.719846057),
    ]]
    fillet(fillet_6_edges, radius=FILLET_6_R)


solid = part.part
